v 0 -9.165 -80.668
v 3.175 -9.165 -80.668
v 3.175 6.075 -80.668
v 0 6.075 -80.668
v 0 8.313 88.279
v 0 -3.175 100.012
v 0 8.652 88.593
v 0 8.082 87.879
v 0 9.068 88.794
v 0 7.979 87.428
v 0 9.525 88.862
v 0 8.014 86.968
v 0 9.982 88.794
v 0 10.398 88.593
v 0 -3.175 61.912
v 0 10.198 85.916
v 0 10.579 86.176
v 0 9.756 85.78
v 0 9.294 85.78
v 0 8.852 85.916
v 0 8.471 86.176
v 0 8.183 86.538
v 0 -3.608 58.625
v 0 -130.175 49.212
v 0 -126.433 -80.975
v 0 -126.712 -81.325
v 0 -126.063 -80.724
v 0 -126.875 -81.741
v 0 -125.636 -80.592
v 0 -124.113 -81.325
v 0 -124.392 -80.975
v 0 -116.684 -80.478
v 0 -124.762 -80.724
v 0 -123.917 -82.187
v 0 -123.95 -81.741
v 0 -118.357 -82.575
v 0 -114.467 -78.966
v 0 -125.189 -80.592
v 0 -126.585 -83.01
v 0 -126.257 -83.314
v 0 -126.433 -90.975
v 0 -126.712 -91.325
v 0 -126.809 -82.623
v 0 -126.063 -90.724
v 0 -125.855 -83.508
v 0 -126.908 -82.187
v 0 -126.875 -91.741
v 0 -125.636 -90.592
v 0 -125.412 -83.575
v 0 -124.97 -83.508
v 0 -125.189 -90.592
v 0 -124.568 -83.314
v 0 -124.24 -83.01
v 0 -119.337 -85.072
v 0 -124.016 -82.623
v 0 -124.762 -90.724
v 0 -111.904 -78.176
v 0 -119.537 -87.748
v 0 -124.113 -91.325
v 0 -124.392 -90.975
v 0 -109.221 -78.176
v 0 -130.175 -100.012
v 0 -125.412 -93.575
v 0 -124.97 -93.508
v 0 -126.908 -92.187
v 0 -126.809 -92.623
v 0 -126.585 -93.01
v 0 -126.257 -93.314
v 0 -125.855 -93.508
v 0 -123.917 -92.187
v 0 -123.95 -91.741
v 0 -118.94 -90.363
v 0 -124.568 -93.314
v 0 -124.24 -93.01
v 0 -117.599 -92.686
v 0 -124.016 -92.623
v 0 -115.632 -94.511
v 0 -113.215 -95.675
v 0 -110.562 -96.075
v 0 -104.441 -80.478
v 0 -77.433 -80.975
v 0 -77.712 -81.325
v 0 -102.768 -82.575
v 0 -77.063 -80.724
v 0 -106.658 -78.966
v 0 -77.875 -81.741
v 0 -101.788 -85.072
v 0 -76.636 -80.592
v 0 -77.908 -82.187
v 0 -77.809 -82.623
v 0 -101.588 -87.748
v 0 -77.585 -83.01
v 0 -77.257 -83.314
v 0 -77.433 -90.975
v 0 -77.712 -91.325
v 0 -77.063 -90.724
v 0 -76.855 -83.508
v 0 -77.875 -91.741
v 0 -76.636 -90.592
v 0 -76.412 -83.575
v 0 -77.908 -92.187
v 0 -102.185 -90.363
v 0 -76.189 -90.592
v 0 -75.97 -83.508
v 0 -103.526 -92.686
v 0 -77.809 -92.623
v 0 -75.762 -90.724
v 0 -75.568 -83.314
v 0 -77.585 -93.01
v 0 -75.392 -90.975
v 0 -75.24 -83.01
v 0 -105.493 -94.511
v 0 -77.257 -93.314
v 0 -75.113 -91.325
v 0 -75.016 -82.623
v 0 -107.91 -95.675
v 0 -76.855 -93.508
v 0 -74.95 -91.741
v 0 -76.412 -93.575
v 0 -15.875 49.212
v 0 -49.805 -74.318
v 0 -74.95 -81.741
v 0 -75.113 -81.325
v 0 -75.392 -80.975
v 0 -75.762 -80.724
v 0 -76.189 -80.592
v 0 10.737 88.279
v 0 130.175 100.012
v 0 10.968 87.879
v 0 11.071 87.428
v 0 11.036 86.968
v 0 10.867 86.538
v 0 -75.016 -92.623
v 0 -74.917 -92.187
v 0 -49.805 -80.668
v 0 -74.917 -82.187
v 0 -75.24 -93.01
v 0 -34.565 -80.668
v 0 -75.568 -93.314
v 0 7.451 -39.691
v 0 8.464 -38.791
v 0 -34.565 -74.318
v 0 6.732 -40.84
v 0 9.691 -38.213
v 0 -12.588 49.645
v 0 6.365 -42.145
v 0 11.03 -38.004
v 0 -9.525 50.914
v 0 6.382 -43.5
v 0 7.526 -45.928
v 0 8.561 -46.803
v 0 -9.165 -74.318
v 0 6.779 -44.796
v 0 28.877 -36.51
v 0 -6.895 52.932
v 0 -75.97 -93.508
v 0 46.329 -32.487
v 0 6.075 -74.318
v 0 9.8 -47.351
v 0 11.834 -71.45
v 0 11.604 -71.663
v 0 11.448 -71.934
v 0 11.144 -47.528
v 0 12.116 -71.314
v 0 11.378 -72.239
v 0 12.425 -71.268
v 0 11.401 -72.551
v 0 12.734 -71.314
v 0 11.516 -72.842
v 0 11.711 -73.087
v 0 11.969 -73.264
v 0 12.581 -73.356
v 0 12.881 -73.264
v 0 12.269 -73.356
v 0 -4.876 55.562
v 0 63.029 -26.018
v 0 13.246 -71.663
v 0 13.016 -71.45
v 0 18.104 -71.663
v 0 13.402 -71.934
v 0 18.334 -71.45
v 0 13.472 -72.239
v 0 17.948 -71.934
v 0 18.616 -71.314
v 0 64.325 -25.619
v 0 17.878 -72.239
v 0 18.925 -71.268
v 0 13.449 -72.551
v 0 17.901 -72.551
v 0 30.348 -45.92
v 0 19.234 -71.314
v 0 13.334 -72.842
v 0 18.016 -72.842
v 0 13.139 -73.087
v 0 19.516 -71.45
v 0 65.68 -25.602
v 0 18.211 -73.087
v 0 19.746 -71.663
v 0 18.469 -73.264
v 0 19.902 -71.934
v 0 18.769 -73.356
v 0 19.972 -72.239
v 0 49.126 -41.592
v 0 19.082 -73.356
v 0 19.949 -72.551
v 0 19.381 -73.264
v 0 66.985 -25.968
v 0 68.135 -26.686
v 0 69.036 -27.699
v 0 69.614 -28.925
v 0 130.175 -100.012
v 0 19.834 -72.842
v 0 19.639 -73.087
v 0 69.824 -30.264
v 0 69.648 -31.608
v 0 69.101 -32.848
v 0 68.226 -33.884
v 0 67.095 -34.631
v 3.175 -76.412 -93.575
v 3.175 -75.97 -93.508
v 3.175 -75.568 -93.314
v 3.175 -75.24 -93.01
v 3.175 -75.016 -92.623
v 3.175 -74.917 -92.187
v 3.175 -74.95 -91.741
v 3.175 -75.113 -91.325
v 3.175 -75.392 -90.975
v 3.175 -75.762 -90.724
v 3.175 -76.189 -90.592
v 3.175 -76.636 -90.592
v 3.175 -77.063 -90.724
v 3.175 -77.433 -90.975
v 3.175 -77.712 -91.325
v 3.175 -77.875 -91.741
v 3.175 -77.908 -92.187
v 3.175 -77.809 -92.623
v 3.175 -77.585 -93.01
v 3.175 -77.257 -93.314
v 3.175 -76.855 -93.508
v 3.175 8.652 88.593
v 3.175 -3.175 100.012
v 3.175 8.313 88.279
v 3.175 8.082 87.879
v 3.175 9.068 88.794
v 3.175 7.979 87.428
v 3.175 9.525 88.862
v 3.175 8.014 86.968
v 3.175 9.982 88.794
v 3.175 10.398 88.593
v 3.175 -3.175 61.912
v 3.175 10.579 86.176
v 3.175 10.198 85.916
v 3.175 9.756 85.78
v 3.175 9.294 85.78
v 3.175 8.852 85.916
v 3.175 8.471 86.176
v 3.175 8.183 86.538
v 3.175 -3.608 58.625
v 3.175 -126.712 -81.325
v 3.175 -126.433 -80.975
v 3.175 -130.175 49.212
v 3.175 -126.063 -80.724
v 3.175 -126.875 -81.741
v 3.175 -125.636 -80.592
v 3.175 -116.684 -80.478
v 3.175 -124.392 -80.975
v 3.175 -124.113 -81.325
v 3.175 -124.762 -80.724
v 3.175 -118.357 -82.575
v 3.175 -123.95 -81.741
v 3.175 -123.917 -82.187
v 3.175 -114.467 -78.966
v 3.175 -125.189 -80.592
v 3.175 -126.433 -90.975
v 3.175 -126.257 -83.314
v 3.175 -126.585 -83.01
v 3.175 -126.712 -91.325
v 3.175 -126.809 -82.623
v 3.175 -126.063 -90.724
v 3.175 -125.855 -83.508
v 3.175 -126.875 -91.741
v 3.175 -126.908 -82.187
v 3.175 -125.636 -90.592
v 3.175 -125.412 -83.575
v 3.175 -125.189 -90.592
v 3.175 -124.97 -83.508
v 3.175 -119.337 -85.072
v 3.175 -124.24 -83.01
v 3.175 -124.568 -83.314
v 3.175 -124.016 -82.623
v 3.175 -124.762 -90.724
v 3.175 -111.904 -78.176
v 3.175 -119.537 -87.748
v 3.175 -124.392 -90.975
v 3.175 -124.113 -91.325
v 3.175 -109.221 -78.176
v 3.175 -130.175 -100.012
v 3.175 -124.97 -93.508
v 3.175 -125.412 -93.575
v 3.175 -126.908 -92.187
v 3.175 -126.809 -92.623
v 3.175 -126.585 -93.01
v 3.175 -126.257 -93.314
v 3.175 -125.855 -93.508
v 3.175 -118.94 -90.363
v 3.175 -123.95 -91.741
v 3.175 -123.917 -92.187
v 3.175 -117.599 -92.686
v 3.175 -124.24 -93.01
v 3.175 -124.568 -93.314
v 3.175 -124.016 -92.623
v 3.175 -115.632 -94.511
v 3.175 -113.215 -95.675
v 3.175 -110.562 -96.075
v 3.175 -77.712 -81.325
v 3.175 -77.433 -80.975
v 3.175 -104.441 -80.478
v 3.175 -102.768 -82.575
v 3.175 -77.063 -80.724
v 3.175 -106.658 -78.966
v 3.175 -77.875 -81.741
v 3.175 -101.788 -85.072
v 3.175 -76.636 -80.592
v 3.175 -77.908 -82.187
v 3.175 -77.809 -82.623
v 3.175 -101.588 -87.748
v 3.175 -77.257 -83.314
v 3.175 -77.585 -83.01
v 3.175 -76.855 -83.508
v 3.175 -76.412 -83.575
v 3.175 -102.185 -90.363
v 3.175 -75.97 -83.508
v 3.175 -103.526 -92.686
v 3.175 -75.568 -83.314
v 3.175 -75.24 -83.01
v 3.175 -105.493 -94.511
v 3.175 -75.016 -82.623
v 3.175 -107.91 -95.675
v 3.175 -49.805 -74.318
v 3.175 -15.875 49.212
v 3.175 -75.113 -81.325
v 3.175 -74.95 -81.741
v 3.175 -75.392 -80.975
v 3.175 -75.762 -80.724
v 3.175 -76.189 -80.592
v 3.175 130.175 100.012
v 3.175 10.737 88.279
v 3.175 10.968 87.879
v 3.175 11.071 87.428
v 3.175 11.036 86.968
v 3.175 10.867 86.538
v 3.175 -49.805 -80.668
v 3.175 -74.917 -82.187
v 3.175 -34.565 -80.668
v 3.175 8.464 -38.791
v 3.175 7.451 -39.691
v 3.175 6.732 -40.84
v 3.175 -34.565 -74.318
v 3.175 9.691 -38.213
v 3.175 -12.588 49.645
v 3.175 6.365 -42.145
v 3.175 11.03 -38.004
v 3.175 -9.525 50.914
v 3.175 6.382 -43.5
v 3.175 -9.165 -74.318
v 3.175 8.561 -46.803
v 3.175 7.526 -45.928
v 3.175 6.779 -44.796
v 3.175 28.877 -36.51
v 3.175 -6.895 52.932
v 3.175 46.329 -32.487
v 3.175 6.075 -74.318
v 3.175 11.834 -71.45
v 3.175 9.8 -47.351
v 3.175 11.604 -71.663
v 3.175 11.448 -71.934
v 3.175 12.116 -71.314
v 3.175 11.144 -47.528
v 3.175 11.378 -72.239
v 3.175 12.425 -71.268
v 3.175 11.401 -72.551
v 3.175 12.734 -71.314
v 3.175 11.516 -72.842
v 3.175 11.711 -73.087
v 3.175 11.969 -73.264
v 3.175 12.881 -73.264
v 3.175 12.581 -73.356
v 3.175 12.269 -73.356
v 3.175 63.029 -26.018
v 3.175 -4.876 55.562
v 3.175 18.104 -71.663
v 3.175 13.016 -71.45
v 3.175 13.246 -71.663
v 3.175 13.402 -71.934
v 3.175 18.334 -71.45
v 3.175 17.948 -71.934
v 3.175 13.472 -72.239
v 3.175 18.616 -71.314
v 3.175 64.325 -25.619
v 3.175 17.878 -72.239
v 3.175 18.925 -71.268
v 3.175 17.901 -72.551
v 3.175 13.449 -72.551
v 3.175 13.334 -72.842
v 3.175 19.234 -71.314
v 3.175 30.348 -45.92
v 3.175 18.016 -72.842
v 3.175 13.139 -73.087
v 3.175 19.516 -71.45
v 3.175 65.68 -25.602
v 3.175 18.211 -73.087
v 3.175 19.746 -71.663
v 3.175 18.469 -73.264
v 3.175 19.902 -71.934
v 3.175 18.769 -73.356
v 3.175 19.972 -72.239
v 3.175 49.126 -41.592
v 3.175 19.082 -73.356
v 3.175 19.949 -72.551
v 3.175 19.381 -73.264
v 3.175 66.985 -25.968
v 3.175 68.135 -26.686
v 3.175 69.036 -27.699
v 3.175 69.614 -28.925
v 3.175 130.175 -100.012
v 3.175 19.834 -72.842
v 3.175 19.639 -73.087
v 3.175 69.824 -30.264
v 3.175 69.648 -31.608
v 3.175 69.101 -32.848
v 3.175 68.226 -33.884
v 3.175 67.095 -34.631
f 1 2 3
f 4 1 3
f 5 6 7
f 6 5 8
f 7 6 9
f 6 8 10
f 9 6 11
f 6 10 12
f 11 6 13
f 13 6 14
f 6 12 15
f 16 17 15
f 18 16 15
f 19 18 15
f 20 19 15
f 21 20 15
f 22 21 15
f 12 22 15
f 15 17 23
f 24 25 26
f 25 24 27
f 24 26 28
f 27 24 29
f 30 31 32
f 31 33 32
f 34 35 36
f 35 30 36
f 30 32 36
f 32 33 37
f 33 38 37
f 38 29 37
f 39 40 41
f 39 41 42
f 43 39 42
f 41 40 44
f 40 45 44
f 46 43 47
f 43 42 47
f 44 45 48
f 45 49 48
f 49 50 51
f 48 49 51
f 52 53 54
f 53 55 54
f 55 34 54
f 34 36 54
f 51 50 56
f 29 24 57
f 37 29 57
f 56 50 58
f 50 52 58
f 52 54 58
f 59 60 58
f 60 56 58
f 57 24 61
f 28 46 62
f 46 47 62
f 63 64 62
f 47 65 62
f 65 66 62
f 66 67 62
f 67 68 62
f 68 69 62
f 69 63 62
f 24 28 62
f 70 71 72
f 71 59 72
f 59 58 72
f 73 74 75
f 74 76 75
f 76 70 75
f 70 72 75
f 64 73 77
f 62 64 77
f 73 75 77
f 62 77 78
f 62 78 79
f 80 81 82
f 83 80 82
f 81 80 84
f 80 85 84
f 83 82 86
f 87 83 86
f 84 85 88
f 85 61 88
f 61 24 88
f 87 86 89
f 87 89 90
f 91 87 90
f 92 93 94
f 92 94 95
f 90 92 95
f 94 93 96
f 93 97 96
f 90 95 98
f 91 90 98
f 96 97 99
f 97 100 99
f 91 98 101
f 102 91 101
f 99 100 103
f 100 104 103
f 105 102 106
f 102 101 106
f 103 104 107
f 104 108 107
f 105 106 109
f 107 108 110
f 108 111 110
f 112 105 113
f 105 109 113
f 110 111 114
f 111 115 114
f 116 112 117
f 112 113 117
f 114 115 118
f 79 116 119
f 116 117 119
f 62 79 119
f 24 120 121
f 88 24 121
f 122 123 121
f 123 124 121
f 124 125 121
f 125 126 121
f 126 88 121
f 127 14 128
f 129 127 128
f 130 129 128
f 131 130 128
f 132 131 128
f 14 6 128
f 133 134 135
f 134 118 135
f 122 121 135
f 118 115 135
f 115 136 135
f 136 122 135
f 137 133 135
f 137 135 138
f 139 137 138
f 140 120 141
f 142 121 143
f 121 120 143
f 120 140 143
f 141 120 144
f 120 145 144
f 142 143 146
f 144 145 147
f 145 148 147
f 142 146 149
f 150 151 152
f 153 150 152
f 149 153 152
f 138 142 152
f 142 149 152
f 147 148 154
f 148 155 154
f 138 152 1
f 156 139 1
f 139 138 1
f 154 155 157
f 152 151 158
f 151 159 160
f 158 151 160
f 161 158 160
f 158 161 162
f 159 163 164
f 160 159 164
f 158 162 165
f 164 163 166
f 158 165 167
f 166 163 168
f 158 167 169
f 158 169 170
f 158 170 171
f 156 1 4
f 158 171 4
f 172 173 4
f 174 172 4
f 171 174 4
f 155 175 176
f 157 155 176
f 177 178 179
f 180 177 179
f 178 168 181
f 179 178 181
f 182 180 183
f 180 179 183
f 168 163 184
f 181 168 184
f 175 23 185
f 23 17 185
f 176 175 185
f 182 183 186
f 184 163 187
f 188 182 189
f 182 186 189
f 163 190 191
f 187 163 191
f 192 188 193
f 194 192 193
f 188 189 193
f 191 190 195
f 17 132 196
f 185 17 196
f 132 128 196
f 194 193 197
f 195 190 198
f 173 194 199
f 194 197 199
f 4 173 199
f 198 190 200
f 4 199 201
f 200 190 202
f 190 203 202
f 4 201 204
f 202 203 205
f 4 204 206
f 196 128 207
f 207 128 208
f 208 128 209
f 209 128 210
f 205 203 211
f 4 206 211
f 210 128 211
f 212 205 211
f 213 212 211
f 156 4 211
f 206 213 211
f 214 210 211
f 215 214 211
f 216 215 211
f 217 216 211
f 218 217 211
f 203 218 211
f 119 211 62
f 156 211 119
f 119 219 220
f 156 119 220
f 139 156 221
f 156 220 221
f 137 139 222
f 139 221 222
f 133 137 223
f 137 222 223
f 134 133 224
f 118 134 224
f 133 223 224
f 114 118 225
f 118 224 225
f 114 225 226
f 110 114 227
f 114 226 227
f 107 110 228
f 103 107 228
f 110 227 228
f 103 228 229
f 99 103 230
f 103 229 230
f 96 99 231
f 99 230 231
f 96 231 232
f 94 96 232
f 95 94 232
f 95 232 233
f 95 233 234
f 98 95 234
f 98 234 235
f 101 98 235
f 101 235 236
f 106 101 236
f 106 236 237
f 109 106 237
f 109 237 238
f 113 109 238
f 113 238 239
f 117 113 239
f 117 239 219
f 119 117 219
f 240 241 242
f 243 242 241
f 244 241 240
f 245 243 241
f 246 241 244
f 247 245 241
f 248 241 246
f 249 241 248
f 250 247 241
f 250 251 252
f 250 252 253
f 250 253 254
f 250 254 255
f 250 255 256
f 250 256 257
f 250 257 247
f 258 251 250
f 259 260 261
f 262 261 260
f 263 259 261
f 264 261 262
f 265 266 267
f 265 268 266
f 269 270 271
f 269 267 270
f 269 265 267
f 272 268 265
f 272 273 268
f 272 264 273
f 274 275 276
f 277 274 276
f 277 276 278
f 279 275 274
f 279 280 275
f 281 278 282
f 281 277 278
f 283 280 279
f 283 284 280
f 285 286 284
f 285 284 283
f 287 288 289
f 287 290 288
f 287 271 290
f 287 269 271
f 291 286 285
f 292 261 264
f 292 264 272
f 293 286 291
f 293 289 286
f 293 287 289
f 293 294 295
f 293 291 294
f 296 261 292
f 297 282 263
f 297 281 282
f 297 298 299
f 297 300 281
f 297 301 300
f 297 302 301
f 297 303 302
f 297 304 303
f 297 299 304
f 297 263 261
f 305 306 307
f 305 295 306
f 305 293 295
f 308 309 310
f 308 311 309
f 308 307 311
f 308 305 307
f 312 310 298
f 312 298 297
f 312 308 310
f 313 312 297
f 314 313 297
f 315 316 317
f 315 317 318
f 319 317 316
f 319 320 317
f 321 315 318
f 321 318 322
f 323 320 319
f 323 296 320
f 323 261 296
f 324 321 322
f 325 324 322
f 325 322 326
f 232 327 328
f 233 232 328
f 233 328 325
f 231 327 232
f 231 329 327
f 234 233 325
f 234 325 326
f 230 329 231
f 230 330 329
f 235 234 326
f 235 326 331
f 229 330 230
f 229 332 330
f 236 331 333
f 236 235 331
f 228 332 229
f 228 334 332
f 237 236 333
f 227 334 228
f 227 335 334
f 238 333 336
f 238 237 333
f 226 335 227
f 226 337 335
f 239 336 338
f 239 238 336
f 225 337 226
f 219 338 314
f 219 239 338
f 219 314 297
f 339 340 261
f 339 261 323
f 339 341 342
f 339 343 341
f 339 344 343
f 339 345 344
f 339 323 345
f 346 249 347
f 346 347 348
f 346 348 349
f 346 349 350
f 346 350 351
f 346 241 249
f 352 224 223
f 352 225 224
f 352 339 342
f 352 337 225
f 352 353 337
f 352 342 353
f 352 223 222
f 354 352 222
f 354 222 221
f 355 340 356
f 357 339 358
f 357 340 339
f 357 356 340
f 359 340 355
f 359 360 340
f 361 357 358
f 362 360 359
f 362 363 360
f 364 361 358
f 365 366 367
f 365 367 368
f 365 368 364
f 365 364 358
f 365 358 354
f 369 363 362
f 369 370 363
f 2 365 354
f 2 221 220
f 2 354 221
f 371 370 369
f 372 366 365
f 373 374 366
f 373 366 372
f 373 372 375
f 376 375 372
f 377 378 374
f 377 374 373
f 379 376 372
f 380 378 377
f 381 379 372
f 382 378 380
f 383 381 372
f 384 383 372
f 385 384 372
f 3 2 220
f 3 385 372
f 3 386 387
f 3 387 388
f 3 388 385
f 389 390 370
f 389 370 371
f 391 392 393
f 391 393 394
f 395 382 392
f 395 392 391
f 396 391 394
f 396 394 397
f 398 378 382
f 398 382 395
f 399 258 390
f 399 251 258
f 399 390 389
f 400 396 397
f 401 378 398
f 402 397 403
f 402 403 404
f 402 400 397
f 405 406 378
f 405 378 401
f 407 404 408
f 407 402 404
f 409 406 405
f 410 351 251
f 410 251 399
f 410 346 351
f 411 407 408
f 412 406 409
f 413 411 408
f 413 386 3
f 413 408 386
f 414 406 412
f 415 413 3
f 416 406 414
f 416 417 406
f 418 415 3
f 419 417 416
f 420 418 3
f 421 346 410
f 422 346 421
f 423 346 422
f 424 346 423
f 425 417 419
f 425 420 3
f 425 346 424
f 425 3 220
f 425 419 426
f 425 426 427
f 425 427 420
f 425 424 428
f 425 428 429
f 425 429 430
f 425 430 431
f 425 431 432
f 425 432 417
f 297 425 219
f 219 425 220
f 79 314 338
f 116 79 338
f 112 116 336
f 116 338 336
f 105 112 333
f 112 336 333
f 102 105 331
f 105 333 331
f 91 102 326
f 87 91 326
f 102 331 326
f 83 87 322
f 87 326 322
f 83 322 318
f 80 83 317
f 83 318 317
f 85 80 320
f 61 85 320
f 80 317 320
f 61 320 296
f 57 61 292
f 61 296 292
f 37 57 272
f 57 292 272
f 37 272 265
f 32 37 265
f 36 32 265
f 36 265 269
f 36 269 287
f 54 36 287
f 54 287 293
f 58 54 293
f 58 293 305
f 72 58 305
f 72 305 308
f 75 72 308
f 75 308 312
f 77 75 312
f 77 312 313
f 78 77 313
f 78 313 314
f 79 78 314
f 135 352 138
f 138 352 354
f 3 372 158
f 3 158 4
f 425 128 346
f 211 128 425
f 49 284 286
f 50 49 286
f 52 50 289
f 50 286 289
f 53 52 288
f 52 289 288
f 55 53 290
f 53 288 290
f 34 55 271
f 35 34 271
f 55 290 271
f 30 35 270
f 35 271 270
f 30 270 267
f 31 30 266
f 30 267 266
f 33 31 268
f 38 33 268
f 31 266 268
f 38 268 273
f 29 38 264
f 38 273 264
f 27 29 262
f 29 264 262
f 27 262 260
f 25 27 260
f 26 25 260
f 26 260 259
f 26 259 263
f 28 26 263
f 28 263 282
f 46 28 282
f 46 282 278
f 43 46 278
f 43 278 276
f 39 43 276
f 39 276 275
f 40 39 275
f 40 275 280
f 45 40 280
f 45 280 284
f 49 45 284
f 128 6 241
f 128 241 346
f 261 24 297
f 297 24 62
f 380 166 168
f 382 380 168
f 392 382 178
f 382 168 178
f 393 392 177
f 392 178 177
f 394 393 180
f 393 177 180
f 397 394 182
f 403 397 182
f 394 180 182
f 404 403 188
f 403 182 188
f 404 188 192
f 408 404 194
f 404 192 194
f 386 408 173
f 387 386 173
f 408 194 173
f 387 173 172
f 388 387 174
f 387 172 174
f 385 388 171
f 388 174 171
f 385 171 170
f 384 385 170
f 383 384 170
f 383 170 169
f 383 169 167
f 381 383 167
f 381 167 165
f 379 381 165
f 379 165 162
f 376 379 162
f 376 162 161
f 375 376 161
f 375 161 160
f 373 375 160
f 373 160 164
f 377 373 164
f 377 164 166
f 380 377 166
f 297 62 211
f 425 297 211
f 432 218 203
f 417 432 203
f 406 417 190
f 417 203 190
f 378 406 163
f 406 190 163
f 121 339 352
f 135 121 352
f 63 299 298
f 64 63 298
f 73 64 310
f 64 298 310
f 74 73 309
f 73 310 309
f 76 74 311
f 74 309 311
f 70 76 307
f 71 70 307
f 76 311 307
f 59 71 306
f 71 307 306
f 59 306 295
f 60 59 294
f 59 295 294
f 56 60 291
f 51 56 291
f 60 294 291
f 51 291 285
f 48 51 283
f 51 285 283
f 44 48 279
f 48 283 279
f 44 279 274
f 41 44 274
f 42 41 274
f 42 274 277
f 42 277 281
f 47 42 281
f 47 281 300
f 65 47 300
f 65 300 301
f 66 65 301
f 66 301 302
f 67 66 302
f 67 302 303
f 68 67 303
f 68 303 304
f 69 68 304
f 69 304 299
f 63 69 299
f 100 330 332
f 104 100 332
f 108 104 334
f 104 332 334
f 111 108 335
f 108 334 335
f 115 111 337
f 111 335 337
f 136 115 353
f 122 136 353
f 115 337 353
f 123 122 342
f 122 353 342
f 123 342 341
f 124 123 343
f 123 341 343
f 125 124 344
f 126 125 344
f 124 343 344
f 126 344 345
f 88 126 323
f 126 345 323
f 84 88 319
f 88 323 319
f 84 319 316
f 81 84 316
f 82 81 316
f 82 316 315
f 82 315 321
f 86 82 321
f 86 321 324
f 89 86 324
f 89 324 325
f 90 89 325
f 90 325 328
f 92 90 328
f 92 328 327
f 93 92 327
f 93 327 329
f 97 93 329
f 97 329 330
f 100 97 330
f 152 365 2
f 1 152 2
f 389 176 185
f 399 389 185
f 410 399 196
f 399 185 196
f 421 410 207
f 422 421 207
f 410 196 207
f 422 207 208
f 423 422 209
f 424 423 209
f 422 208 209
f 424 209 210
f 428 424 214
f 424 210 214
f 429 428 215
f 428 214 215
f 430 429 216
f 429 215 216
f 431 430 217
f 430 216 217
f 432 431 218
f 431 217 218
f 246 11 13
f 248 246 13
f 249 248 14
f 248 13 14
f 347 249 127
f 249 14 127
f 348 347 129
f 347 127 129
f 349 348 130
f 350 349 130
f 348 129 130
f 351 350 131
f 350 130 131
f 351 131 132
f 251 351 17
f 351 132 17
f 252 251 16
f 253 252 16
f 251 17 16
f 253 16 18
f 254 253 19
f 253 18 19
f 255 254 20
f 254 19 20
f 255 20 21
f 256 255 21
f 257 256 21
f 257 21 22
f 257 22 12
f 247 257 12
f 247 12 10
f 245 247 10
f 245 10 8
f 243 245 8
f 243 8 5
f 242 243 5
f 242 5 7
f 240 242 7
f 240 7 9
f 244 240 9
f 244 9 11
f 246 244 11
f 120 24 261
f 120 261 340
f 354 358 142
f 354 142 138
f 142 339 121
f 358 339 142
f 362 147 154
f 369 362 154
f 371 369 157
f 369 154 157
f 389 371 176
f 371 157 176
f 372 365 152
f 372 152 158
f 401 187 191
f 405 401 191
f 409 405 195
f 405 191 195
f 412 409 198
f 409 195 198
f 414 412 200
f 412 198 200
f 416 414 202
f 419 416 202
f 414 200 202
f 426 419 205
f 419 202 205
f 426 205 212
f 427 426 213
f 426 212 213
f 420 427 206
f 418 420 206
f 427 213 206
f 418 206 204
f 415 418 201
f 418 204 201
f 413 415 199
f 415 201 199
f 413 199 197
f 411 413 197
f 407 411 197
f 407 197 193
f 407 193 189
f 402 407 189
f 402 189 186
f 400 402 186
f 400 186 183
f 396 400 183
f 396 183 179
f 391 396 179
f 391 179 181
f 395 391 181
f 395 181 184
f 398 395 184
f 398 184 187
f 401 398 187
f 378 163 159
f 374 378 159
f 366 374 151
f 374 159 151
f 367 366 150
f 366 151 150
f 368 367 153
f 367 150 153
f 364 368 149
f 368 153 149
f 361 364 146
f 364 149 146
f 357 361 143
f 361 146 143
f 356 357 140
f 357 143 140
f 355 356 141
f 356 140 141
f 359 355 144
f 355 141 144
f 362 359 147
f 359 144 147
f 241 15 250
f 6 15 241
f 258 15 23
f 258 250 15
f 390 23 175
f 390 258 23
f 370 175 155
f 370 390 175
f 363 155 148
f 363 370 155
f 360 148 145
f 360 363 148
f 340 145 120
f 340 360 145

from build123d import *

# Parameters (mm, degrees)
SKETCH1_W           = 200.025
SKETCH1_H           = 260.35
BOSS_EXTRUDE1_DEPTH = 3.175
SKETCH8_R           = 1.55
SKETCH8_R_2         = 1.0499979
CUT_EXTRUDE7_DEPTH  = 4.175
SKETCH9_W           = 50.8
SKETCH9_H           = 127
CUT_EXTRUDE8_DEPTH  = 4.175
FILLET1_R           = 12.7
CUT_EXTRUDE9_DEPTH  = 4.175
SKETCH15_W          = 6.35
SKETCH15_H          = 15.24
CUT_EXTRUDE12_DEPTH = 4.175
SKETCH16_R          = 1.5
SKETCH16_R_2        = 9
CUT_EXTRUDE13_DEPTH = 4.175


with BuildPart() as part:
    # Sketch1 → Boss-Extrude1 (new body)
    with BuildSketch(Plane(origin=(0, 0, 0), x_dir=(0, 0, -1), z_dir=(1, 0, 0))):
        Rectangle(SKETCH1_W, SKETCH1_H)
    extrude(amount=BOSS_EXTRUDE1_DEPTH)

    # Sketch8 → Cut-Extrude7 (cut, through all)
    with BuildSketch(Plane.ZY):
        with Locations((87.3125, 9.525)):
            Circle(SKETCH8_R)
        with Locations((-72.3175, 18.9250066)):
            Circle(SKETCH8_R_2)
        with Locations((-72.3175, 12.4249942)):
            Circle(SKETCH8_R_2)
    extrude(amount=-CUT_EXTRUDE7_DEPTH, mode=Mode.SUBTRACT)

    # Sketch9 → Cut-Extrude8 (cut, through all)
    with BuildSketch(Plane.ZY):
        with Locations((74.6125, -66.675)):
            Rectangle(SKETCH9_W, SKETCH9_H)
    extrude(amount=-CUT_EXTRUDE8_DEPTH, mode=Mode.SUBTRACT)

    # Fillet1
    fillet1_edges = [part.edges().sort_by_distance(p)[0] for p in [
        (1.5875, -3.175, 49.2125),
    ]]
    fillet(fillet1_edges, radius=FILLET1_R)

    # Sketch10 → Cut-Extrude9 (cut, through all)
    with BuildSketch(Plane.ZY):
        with BuildLine():
            ThreePointArc((-34.631218673, 67.095364965), (-44.09213985, 39.8142402), (-47.528128749, 11.144346963))
            ThreePointArc((-47.528128749, 11.144346963), (-42.823162504, 6.325000001), (-38.003815542, 11.029966247))
            ThreePointArc((-38.003815542, 11.029966247), (-34.810523806, 37.674794334), (-26.017864022, 63.028948034))
            ThreePointArc((-26.017864022, 63.028948034), (-28.291332832, 69.36883393), (-34.631218673, 67.095364965))
        make_face()
    extrude(amount=-CUT_EXTRUDE9_DEPTH, mode=Mode.SUBTRACT)

    # Sketch15 → Cut-Extrude12 (cut, through all)
    with BuildSketch(Plane(origin=(3.175, 0, 0), x_dir=(0, 0, -1), z_dir=(1, 0, 0))):
        with Locations((77.4925, -1.5450058)):
            Rectangle(SKETCH15_W, SKETCH15_H)
        with Locations((77.4925, -42.1850058)):
            Rectangle(SKETCH15_W, SKETCH15_H)
    extrude(amount=-CUT_EXTRUDE12_DEPTH, mode=Mode.SUBTRACT)

    # Sketch16 → Cut-Extrude13 (cut, through all)
    with BuildSketch(Plane(origin=(3.175, 0, 0), x_dir=(0, 0, -1), z_dir=(1, 0, 0))):
        with Locations((82.075, -125.4125)):
            Circle(SKETCH16_R)
        with Locations((82.075, -76.4125)):
            Circle(SKETCH16_R)
        with Locations((92.075, -125.4125)):
            Circle(SKETCH16_R)
        with Locations((92.075, -76.4125)):
            Circle(SKETCH16_R)
        with Locations((87.075, -110.5624916)):
            Circle(SKETCH16_R_2)
    extrude(amount=-CUT_EXTRUDE13_DEPTH, mode=Mode.SUBTRACT)


solid = part.part
